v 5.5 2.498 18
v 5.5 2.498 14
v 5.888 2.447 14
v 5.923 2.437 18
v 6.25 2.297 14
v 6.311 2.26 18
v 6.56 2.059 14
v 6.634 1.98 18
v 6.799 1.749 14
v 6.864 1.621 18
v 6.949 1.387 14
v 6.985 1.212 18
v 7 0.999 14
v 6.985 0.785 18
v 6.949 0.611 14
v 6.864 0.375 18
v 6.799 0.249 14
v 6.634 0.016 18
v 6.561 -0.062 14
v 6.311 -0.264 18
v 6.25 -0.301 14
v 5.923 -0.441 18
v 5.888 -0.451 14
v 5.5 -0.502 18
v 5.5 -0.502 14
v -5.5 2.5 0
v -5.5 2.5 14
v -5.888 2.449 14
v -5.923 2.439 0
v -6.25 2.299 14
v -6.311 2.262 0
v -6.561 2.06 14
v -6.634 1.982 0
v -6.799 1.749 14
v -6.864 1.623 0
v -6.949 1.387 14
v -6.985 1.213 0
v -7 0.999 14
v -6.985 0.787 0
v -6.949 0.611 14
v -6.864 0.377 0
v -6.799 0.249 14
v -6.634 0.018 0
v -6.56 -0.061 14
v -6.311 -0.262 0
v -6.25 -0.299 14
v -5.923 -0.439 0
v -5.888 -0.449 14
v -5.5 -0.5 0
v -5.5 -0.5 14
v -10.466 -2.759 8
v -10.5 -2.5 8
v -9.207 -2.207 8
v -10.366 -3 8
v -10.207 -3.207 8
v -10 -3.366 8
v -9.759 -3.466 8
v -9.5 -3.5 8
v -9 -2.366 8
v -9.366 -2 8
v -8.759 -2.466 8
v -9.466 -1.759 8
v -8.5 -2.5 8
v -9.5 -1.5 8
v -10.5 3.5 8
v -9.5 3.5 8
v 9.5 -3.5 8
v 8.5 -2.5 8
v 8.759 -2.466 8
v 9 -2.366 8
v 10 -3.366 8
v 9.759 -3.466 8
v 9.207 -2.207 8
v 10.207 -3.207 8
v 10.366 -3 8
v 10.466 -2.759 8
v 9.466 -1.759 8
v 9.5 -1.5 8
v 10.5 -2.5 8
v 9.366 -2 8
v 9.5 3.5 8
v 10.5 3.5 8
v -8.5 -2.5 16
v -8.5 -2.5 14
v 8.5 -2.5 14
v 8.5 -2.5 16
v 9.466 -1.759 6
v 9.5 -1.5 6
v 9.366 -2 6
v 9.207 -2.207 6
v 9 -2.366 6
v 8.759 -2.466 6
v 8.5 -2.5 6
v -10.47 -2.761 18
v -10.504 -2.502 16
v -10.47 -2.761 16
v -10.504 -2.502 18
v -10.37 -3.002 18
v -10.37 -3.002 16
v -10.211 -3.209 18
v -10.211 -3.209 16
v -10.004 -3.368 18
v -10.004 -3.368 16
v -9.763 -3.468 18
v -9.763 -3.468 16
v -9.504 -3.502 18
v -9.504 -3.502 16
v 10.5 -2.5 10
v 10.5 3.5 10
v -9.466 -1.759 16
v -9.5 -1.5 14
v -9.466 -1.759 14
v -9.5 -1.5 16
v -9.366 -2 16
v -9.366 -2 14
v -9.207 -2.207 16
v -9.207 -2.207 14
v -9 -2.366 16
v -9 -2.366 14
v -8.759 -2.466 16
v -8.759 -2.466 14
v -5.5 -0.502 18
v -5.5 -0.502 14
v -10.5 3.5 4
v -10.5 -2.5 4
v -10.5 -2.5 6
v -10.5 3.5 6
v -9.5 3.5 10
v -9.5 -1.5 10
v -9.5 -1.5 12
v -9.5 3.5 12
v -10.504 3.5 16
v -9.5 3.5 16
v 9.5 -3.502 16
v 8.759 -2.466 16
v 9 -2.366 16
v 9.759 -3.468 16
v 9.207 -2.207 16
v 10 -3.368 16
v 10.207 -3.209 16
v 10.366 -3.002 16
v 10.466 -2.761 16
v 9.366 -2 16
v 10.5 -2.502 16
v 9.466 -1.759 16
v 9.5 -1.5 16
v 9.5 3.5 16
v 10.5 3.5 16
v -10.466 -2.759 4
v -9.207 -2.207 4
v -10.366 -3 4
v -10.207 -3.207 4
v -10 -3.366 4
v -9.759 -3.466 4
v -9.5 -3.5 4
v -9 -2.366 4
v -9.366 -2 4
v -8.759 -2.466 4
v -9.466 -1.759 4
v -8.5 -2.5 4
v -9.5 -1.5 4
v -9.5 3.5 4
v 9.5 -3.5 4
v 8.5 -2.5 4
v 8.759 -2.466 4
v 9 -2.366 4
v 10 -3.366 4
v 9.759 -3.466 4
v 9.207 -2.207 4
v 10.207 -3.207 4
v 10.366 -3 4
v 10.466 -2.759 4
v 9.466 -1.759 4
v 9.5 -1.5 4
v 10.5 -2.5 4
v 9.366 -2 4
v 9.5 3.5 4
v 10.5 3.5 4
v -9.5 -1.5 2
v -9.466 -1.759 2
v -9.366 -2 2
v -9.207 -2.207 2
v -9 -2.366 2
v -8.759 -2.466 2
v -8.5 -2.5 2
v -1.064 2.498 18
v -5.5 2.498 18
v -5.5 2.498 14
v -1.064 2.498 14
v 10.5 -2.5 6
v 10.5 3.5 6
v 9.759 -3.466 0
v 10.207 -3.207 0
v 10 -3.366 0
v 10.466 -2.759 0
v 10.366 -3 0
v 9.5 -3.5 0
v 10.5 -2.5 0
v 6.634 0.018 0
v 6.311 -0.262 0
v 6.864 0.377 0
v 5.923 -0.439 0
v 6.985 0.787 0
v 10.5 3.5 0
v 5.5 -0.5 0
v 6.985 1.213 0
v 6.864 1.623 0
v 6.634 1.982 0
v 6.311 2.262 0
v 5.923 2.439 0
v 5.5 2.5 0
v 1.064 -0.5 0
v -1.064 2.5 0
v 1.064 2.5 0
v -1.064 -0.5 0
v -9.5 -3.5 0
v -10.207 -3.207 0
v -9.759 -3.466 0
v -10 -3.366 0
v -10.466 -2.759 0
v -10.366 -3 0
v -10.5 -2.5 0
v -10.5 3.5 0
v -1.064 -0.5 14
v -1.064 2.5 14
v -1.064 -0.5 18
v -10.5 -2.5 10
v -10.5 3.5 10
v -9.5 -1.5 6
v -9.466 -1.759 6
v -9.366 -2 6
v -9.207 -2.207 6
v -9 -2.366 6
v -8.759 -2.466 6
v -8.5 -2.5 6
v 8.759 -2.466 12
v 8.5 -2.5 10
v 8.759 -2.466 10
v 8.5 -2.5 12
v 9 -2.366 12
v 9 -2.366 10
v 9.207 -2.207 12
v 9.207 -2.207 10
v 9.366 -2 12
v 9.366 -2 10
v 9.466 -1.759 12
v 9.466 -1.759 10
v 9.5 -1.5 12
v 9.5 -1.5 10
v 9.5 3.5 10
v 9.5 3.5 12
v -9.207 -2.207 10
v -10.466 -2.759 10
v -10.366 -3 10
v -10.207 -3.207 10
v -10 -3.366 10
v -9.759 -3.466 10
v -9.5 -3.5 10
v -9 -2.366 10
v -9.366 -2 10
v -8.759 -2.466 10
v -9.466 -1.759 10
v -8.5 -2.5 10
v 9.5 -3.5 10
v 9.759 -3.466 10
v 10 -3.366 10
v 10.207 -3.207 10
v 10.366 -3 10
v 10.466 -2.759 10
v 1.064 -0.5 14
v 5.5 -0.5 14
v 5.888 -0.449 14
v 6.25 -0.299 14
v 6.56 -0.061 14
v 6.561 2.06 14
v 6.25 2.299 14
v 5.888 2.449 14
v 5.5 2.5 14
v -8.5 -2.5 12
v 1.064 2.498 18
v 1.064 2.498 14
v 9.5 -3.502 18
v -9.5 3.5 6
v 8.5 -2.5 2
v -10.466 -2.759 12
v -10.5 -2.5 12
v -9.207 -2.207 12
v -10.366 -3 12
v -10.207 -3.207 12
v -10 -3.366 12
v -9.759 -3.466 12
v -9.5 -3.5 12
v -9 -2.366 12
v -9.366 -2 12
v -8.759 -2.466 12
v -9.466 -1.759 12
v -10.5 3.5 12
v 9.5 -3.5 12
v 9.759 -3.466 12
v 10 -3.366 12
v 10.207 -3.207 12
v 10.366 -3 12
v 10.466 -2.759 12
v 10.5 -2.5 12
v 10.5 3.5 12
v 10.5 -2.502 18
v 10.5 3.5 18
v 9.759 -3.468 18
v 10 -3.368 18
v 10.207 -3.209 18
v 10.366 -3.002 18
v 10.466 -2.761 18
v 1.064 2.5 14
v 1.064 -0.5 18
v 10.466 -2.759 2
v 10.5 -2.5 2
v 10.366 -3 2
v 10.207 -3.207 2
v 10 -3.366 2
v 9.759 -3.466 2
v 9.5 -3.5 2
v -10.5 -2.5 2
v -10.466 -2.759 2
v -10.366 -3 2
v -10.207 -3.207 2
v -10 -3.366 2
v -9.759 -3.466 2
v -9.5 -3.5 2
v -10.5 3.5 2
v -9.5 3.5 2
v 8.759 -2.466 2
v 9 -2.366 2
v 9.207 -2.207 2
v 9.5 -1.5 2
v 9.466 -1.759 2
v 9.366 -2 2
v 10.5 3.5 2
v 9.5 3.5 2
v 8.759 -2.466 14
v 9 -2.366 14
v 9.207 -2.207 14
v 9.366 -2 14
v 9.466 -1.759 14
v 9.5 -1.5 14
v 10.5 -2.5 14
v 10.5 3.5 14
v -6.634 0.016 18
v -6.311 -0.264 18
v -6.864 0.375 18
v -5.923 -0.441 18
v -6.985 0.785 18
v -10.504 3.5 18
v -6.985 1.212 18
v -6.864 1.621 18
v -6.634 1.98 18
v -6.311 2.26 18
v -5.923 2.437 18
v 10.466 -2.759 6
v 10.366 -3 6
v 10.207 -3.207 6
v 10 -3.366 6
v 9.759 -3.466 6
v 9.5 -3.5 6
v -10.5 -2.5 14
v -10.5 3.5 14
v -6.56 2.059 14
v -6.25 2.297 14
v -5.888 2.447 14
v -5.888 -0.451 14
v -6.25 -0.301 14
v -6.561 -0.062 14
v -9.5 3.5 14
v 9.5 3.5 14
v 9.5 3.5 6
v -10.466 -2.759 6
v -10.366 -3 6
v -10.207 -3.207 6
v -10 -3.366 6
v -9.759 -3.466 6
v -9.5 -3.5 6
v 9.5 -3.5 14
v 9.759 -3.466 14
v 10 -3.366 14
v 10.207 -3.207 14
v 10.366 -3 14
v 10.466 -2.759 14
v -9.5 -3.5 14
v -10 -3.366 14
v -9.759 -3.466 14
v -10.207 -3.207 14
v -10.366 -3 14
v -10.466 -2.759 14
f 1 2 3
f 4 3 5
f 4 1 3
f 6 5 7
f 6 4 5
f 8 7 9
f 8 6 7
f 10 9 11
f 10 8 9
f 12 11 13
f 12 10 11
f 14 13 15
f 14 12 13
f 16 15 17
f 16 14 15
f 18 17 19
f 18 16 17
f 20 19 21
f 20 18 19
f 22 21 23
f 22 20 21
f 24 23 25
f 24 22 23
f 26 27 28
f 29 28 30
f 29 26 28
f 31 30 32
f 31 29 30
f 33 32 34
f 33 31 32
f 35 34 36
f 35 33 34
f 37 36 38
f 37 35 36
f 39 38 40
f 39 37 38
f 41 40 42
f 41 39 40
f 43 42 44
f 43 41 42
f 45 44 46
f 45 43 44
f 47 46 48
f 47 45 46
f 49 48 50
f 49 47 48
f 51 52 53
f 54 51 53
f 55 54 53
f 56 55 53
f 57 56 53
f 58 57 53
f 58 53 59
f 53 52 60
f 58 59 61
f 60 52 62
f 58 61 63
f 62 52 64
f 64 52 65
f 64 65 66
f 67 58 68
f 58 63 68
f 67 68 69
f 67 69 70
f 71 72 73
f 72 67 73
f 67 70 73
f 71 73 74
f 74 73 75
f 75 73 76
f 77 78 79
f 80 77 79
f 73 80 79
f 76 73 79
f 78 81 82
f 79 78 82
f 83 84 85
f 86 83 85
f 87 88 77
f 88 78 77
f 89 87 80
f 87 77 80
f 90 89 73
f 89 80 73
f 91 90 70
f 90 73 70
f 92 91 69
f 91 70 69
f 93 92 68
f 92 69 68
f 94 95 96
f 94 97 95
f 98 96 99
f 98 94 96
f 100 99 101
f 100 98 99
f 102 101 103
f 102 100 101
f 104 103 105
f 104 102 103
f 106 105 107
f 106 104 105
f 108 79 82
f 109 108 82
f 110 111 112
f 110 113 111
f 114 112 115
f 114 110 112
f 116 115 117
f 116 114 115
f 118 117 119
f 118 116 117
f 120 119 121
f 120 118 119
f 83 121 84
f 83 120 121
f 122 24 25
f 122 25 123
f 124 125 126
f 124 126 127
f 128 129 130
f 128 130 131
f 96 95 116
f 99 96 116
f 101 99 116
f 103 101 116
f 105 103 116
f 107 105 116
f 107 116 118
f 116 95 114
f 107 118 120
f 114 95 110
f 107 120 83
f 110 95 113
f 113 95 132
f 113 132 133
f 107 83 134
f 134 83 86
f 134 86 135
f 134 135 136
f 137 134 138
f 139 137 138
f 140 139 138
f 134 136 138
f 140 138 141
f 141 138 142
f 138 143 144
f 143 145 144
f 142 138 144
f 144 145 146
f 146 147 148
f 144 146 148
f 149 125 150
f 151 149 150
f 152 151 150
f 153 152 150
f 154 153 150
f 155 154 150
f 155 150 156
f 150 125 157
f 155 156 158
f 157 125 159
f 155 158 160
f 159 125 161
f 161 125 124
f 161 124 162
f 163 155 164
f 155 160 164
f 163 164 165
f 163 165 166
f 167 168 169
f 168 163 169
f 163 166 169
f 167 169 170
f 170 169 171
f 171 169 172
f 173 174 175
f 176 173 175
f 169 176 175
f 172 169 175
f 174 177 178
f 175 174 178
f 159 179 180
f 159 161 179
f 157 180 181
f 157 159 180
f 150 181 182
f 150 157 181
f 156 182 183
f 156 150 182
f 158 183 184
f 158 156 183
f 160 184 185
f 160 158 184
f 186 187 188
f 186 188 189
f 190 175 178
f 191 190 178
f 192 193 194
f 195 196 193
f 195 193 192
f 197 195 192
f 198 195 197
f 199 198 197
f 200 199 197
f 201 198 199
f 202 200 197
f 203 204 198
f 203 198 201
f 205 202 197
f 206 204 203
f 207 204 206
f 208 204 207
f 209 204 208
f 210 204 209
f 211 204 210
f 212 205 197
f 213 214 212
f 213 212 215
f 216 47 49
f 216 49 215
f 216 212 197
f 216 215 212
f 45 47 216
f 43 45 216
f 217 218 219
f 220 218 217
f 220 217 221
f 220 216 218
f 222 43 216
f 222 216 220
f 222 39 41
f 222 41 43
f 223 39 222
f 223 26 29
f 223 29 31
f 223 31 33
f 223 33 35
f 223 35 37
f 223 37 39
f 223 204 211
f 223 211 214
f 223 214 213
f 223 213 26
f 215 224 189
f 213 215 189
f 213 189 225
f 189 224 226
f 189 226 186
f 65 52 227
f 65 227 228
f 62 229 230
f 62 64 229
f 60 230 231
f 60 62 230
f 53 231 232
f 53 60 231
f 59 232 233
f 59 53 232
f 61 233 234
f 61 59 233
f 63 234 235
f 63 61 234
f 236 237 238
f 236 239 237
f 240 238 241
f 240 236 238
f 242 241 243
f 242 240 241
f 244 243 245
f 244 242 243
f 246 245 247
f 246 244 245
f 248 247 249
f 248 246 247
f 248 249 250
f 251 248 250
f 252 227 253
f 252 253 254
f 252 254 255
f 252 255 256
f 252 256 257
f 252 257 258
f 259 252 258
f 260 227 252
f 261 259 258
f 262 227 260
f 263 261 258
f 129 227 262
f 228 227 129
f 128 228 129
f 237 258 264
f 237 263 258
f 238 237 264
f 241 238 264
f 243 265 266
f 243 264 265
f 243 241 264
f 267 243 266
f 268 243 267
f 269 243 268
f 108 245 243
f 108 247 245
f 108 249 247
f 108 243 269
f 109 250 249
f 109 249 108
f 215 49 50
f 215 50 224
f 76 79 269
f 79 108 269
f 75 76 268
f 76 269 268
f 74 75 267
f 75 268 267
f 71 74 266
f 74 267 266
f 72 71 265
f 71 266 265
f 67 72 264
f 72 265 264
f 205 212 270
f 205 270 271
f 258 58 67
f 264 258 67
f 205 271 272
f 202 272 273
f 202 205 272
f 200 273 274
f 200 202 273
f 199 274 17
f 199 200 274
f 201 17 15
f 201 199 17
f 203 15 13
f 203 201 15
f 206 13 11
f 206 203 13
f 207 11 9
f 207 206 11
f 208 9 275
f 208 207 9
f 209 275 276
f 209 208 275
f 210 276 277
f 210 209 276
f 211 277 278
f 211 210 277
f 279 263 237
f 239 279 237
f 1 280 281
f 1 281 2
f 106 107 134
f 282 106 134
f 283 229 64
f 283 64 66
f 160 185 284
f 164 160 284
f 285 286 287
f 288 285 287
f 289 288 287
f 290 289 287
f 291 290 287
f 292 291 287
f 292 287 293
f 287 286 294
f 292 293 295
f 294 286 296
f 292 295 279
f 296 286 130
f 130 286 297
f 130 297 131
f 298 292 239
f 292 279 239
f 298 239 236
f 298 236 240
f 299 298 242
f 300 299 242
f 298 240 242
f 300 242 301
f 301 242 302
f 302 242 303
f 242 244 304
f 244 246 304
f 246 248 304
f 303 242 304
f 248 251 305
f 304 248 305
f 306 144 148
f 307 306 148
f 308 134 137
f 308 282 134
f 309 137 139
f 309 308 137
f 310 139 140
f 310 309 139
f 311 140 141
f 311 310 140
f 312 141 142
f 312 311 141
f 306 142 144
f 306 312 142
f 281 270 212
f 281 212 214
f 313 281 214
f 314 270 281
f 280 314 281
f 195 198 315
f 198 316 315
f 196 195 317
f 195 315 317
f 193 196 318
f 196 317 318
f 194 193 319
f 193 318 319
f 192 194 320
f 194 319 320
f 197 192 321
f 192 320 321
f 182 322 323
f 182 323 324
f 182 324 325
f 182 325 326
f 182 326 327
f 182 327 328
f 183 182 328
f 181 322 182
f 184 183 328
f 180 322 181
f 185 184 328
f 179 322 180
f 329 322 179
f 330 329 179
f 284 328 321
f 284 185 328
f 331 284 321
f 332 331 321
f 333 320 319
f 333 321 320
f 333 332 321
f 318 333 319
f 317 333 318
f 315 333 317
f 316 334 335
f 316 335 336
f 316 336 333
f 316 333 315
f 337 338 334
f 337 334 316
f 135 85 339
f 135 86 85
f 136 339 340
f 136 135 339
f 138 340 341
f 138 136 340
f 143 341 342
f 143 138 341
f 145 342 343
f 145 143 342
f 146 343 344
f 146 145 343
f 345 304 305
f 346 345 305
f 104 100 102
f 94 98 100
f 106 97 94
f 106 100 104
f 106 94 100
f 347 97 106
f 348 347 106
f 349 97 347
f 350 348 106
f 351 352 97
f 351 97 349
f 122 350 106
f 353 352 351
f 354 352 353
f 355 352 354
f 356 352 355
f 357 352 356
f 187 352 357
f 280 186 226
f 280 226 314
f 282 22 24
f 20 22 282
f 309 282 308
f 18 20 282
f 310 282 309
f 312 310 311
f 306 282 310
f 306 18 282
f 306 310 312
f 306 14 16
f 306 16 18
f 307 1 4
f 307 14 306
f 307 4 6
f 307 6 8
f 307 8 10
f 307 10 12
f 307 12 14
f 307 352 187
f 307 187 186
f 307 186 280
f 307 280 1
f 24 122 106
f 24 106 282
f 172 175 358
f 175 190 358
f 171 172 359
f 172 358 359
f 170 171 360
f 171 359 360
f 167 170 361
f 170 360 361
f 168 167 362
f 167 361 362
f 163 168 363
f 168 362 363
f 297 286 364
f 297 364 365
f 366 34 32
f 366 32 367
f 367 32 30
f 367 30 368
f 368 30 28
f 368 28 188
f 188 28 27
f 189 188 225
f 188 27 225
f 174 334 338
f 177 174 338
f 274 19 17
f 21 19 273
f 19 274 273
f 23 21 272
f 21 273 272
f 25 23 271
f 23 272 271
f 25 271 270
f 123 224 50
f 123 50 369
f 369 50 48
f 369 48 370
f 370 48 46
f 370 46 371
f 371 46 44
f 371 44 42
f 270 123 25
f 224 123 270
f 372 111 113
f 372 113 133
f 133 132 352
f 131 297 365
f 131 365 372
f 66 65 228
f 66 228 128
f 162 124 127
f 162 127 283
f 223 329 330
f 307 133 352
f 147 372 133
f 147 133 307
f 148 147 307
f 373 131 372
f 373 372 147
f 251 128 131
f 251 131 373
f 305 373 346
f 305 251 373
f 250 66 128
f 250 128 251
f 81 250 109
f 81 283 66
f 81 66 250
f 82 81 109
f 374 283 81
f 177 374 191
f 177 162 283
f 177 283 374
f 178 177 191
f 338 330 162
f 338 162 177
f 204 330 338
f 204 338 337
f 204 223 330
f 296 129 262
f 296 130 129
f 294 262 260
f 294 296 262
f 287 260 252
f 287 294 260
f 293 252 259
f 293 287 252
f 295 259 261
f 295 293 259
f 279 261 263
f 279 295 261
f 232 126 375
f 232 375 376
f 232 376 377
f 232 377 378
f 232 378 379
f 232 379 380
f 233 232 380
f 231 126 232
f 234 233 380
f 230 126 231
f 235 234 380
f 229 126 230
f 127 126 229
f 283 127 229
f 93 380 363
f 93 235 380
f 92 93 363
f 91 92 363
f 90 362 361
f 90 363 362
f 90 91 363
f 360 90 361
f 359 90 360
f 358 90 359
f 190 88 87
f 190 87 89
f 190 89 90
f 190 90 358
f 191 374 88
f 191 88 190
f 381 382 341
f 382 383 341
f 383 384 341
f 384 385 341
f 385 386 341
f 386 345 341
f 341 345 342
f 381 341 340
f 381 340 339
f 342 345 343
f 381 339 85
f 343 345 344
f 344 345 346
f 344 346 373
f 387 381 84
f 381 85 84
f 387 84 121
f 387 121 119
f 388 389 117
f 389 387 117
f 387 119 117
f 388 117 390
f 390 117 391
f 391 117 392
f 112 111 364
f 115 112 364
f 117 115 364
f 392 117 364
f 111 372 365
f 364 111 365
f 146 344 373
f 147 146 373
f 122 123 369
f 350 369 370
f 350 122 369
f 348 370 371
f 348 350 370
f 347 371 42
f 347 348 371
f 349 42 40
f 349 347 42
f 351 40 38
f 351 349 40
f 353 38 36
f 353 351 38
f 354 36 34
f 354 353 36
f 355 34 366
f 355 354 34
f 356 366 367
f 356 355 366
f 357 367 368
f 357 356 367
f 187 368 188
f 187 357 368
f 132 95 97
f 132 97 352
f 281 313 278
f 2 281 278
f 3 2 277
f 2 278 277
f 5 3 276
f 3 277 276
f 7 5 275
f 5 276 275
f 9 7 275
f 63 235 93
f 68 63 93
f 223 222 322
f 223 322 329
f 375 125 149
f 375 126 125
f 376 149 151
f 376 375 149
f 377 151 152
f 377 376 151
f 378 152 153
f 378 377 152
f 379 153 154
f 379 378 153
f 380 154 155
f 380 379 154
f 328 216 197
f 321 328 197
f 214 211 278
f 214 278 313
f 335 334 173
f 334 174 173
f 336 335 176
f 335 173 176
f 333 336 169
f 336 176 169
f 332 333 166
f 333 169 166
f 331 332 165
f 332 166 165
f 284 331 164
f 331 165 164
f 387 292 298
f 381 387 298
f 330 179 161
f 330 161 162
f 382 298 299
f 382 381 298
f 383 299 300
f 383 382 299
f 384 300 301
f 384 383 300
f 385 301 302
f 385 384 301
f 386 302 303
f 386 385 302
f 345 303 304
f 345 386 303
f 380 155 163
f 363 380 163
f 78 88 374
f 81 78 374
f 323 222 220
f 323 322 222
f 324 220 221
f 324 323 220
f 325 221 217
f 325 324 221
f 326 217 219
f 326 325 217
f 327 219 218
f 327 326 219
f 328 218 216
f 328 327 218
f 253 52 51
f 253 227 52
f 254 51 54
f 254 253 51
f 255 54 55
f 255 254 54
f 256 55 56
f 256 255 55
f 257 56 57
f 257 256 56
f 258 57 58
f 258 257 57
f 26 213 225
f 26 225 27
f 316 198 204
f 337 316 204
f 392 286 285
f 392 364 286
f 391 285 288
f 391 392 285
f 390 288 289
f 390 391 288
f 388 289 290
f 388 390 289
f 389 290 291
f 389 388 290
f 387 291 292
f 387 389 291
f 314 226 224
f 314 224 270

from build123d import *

# Parameters (mm, degrees)
SKETCH2_W            = 21
SKETCH2_H            = 7
BOSS_EXTRUDE1_DEPTH  = 2
SKETCH3_W            = 19
SKETCH3_H            = 6
BOSS_EXTRUDE2_DEPTH  = 2
SKETCH4_W            = 21
SKETCH4_H            = 7
BOSS_EXTRUDE3_DEPTH  = 2
SKETCH5_W            = 19
SKETCH5_H            = 6
BOSS_EXTRUDE4_DEPTH  = 2
SKETCH6_W            = 21
SKETCH6_H            = 7
BOSS_EXTRUDE5_DEPTH  = 2
SKETCH7_W            = 19
SKETCH7_H            = 6
BOSS_EXTRUDE6_DEPTH  = 2
SKETCH8_W            = 21
SKETCH8_H            = 7
BOSS_EXTRUDE7_DEPTH  = 2
FILLET1_R            = 1
CUT_EXTRUDE2_DEPTH   = 14
SKETCH13_W           = 2.12863245
SKETCH13_H           = 3.140125133
BOSS_EXTRUDE9_DEPTH  = 14
SKETCH14_W           = 19
SKETCH14_H           = 6
BOSS_EXTRUDE10_DEPTH = 2
SKETCH15_W           = 21.003804152
SKETCH15_H           = 7.001896417
BOSS_EXTRUDE11_DEPTH = 2
FILLET2_R            = 1
CUT_EXTRUDE4_DEPTH   = 4
SKETCH17_W           = 2.12863245
SKETCH17_H           = 2.998103583
BOSS_EXTRUDE12_DEPTH = 4


with BuildPart() as part:
    # Sketch2 → Boss-Extrude1 (new body)
    with BuildSketch(Plane.XY):
        Rectangle(SKETCH2_W, SKETCH2_H)
    extrude(amount=BOSS_EXTRUDE1_DEPTH)

    # Sketch3 → Boss-Extrude2 (add)
    with BuildSketch(Plane.XY.offset(2)):
        with Locations((0, 0.5)):
            Rectangle(SKETCH3_W, SKETCH3_H)
    extrude(amount=BOSS_EXTRUDE2_DEPTH)

    # Sketch4 → Boss-Extrude3 (add)
    with BuildSketch(Plane.XY.offset(4)):
        Rectangle(SKETCH4_W, SKETCH4_H)
    extrude(amount=BOSS_EXTRUDE3_DEPTH)

    # Sketch5 → Boss-Extrude4 (add)
    with BuildSketch(Plane.XY.offset(6)):
        with Locations((0, 0.5)):
            Rectangle(SKETCH5_W, SKETCH5_H)
    extrude(amount=BOSS_EXTRUDE4_DEPTH)

    # Sketch6 → Boss-Extrude5 (add)
    with BuildSketch(Plane.XY.offset(8)):
        Rectangle(SKETCH6_W, SKETCH6_H)
    extrude(amount=BOSS_EXTRUDE5_DEPTH)

    # Sketch7 → Boss-Extrude6 (add)
    with BuildSketch(Plane.XY.offset(10)):
        with Locations((0, 0.5)):
            Rectangle(SKETCH7_W, SKETCH7_H)
    extrude(amount=BOSS_EXTRUDE6_DEPTH)

    # Sketch8 → Boss-Extrude7 (add)
    with BuildSketch(Plane.XY.offset(12)):
        Rectangle(SKETCH8_W, SKETCH8_H)
    extrude(amount=BOSS_EXTRUDE7_DEPTH)

    # Fillet1
    fillet1_edges = [part.edges().sort_by_distance(p)[0] for p in [
        (-9.5, -2.5, 3),
        (9.5, -2.5, 3),
        (-10.5, -3.5, 5),
        (10.5, -3.5, 5),
        (-9.5, -2.5, 7),
        (9.5, -2.5, 7),
        (10.5, -3.5, 9),
        (-10.5, -3.5, 9),
        (-9.5, -2.5, 11),
        (9.5, -2.5, 11),
        (10.5, -3.5, 1),
        (-10.5, -3.5, 13),
        (10.5, -3.5, 13),
        (-10.5, -3.5, 1),
    ]]
    fillet(fillet1_edges, radius=FILLET1_R)

    # Sketch12 → Cut-Extrude2 (cut)
    with BuildSketch(Plane(origin=(0, 0, 0), x_dir=(-1, 0, 0), z_dir=(0, 0, -1))):
        with BuildLine():
            Line((-5.5, 2.5), (5.5, 2.5))
            ThreePointArc((5.5, 2.5), (7, 1), (5.5, -0.5))
            Line((5.5, -0.5), (-5.5, -0.5))
            ThreePointArc((-5.5, -0.5), (-7, 1), (-5.5, 2.5))
        make_face()
    extrude(amount=-CUT_EXTRUDE2_DEPTH, mode=Mode.SUBTRACT)

    # Sketch13 → Boss-Extrude9 (add)
    with BuildSketch(Plane(origin=(0, 0, 0), x_dir=(-1, 0, 0), z_dir=(0, 0, -1))):
        with Locations((0, 1.070062567)):
            Rectangle(SKETCH13_W, SKETCH13_H)
    extrude(amount=-BOSS_EXTRUDE9_DEPTH)

    # Sketch14 → Boss-Extrude10 (add)
    with BuildSketch(Plane.XY.offset(14)):
        with Locations((0, 0.5)):
            Rectangle(SKETCH14_W, SKETCH14_H)
    extrude(amount=BOSS_EXTRUDE10_DEPTH)

    # Sketch15 → Boss-Extrude11 (add)
    with BuildSketch(Plane.XY.offset(16)):
        with Locations((-0.001902076, -0.000948209)):
            Rectangle(SKETCH15_W, SKETCH15_H)
    extrude(amount=BOSS_EXTRUDE11_DEPTH)

    # Fillet2
    fillet2_edges = [part.edges().sort_by_distance(p)[0] for p in [
        (9.5, -2.5, 15),
        (-9.5, -2.5, 15),
        (10.5, -3.501896417, 17),
        (-10.503804152, -3.501896417, 17),
    ]]
    fillet(fillet2_edges, radius=FILLET2_R)

    # Sketch16 → Cut-Extrude4 (cut)
    with BuildSketch(Plane.XY.offset(18)):
        with BuildLine():
            Line((5.5, -0.501896417), (-5.5, -0.501896417))
            ThreePointArc((-5.5, -0.501896417), (-7, 0.998103583), (-5.5, 2.498103583))
            Line((-5.5, 2.498103583), (5.5, 2.498103583))
            ThreePointArc((5.5, 2.498103583), (7, 0.998103583), (5.5, -0.501896417))
        make_face()
    extrude(amount=-CUT_EXTRUDE4_DEPTH, mode=Mode.SUBTRACT)

    # Sketch17 → Boss-Extrude12 (add)
    with BuildSketch(Plane.XY.offset(18)):
        with Locations((0, 0.999051792)):
            Rectangle(SKETCH17_W, SKETCH17_H)
    extrude(amount=-BOSS_EXTRUDE12_DEPTH)


solid = part.part
